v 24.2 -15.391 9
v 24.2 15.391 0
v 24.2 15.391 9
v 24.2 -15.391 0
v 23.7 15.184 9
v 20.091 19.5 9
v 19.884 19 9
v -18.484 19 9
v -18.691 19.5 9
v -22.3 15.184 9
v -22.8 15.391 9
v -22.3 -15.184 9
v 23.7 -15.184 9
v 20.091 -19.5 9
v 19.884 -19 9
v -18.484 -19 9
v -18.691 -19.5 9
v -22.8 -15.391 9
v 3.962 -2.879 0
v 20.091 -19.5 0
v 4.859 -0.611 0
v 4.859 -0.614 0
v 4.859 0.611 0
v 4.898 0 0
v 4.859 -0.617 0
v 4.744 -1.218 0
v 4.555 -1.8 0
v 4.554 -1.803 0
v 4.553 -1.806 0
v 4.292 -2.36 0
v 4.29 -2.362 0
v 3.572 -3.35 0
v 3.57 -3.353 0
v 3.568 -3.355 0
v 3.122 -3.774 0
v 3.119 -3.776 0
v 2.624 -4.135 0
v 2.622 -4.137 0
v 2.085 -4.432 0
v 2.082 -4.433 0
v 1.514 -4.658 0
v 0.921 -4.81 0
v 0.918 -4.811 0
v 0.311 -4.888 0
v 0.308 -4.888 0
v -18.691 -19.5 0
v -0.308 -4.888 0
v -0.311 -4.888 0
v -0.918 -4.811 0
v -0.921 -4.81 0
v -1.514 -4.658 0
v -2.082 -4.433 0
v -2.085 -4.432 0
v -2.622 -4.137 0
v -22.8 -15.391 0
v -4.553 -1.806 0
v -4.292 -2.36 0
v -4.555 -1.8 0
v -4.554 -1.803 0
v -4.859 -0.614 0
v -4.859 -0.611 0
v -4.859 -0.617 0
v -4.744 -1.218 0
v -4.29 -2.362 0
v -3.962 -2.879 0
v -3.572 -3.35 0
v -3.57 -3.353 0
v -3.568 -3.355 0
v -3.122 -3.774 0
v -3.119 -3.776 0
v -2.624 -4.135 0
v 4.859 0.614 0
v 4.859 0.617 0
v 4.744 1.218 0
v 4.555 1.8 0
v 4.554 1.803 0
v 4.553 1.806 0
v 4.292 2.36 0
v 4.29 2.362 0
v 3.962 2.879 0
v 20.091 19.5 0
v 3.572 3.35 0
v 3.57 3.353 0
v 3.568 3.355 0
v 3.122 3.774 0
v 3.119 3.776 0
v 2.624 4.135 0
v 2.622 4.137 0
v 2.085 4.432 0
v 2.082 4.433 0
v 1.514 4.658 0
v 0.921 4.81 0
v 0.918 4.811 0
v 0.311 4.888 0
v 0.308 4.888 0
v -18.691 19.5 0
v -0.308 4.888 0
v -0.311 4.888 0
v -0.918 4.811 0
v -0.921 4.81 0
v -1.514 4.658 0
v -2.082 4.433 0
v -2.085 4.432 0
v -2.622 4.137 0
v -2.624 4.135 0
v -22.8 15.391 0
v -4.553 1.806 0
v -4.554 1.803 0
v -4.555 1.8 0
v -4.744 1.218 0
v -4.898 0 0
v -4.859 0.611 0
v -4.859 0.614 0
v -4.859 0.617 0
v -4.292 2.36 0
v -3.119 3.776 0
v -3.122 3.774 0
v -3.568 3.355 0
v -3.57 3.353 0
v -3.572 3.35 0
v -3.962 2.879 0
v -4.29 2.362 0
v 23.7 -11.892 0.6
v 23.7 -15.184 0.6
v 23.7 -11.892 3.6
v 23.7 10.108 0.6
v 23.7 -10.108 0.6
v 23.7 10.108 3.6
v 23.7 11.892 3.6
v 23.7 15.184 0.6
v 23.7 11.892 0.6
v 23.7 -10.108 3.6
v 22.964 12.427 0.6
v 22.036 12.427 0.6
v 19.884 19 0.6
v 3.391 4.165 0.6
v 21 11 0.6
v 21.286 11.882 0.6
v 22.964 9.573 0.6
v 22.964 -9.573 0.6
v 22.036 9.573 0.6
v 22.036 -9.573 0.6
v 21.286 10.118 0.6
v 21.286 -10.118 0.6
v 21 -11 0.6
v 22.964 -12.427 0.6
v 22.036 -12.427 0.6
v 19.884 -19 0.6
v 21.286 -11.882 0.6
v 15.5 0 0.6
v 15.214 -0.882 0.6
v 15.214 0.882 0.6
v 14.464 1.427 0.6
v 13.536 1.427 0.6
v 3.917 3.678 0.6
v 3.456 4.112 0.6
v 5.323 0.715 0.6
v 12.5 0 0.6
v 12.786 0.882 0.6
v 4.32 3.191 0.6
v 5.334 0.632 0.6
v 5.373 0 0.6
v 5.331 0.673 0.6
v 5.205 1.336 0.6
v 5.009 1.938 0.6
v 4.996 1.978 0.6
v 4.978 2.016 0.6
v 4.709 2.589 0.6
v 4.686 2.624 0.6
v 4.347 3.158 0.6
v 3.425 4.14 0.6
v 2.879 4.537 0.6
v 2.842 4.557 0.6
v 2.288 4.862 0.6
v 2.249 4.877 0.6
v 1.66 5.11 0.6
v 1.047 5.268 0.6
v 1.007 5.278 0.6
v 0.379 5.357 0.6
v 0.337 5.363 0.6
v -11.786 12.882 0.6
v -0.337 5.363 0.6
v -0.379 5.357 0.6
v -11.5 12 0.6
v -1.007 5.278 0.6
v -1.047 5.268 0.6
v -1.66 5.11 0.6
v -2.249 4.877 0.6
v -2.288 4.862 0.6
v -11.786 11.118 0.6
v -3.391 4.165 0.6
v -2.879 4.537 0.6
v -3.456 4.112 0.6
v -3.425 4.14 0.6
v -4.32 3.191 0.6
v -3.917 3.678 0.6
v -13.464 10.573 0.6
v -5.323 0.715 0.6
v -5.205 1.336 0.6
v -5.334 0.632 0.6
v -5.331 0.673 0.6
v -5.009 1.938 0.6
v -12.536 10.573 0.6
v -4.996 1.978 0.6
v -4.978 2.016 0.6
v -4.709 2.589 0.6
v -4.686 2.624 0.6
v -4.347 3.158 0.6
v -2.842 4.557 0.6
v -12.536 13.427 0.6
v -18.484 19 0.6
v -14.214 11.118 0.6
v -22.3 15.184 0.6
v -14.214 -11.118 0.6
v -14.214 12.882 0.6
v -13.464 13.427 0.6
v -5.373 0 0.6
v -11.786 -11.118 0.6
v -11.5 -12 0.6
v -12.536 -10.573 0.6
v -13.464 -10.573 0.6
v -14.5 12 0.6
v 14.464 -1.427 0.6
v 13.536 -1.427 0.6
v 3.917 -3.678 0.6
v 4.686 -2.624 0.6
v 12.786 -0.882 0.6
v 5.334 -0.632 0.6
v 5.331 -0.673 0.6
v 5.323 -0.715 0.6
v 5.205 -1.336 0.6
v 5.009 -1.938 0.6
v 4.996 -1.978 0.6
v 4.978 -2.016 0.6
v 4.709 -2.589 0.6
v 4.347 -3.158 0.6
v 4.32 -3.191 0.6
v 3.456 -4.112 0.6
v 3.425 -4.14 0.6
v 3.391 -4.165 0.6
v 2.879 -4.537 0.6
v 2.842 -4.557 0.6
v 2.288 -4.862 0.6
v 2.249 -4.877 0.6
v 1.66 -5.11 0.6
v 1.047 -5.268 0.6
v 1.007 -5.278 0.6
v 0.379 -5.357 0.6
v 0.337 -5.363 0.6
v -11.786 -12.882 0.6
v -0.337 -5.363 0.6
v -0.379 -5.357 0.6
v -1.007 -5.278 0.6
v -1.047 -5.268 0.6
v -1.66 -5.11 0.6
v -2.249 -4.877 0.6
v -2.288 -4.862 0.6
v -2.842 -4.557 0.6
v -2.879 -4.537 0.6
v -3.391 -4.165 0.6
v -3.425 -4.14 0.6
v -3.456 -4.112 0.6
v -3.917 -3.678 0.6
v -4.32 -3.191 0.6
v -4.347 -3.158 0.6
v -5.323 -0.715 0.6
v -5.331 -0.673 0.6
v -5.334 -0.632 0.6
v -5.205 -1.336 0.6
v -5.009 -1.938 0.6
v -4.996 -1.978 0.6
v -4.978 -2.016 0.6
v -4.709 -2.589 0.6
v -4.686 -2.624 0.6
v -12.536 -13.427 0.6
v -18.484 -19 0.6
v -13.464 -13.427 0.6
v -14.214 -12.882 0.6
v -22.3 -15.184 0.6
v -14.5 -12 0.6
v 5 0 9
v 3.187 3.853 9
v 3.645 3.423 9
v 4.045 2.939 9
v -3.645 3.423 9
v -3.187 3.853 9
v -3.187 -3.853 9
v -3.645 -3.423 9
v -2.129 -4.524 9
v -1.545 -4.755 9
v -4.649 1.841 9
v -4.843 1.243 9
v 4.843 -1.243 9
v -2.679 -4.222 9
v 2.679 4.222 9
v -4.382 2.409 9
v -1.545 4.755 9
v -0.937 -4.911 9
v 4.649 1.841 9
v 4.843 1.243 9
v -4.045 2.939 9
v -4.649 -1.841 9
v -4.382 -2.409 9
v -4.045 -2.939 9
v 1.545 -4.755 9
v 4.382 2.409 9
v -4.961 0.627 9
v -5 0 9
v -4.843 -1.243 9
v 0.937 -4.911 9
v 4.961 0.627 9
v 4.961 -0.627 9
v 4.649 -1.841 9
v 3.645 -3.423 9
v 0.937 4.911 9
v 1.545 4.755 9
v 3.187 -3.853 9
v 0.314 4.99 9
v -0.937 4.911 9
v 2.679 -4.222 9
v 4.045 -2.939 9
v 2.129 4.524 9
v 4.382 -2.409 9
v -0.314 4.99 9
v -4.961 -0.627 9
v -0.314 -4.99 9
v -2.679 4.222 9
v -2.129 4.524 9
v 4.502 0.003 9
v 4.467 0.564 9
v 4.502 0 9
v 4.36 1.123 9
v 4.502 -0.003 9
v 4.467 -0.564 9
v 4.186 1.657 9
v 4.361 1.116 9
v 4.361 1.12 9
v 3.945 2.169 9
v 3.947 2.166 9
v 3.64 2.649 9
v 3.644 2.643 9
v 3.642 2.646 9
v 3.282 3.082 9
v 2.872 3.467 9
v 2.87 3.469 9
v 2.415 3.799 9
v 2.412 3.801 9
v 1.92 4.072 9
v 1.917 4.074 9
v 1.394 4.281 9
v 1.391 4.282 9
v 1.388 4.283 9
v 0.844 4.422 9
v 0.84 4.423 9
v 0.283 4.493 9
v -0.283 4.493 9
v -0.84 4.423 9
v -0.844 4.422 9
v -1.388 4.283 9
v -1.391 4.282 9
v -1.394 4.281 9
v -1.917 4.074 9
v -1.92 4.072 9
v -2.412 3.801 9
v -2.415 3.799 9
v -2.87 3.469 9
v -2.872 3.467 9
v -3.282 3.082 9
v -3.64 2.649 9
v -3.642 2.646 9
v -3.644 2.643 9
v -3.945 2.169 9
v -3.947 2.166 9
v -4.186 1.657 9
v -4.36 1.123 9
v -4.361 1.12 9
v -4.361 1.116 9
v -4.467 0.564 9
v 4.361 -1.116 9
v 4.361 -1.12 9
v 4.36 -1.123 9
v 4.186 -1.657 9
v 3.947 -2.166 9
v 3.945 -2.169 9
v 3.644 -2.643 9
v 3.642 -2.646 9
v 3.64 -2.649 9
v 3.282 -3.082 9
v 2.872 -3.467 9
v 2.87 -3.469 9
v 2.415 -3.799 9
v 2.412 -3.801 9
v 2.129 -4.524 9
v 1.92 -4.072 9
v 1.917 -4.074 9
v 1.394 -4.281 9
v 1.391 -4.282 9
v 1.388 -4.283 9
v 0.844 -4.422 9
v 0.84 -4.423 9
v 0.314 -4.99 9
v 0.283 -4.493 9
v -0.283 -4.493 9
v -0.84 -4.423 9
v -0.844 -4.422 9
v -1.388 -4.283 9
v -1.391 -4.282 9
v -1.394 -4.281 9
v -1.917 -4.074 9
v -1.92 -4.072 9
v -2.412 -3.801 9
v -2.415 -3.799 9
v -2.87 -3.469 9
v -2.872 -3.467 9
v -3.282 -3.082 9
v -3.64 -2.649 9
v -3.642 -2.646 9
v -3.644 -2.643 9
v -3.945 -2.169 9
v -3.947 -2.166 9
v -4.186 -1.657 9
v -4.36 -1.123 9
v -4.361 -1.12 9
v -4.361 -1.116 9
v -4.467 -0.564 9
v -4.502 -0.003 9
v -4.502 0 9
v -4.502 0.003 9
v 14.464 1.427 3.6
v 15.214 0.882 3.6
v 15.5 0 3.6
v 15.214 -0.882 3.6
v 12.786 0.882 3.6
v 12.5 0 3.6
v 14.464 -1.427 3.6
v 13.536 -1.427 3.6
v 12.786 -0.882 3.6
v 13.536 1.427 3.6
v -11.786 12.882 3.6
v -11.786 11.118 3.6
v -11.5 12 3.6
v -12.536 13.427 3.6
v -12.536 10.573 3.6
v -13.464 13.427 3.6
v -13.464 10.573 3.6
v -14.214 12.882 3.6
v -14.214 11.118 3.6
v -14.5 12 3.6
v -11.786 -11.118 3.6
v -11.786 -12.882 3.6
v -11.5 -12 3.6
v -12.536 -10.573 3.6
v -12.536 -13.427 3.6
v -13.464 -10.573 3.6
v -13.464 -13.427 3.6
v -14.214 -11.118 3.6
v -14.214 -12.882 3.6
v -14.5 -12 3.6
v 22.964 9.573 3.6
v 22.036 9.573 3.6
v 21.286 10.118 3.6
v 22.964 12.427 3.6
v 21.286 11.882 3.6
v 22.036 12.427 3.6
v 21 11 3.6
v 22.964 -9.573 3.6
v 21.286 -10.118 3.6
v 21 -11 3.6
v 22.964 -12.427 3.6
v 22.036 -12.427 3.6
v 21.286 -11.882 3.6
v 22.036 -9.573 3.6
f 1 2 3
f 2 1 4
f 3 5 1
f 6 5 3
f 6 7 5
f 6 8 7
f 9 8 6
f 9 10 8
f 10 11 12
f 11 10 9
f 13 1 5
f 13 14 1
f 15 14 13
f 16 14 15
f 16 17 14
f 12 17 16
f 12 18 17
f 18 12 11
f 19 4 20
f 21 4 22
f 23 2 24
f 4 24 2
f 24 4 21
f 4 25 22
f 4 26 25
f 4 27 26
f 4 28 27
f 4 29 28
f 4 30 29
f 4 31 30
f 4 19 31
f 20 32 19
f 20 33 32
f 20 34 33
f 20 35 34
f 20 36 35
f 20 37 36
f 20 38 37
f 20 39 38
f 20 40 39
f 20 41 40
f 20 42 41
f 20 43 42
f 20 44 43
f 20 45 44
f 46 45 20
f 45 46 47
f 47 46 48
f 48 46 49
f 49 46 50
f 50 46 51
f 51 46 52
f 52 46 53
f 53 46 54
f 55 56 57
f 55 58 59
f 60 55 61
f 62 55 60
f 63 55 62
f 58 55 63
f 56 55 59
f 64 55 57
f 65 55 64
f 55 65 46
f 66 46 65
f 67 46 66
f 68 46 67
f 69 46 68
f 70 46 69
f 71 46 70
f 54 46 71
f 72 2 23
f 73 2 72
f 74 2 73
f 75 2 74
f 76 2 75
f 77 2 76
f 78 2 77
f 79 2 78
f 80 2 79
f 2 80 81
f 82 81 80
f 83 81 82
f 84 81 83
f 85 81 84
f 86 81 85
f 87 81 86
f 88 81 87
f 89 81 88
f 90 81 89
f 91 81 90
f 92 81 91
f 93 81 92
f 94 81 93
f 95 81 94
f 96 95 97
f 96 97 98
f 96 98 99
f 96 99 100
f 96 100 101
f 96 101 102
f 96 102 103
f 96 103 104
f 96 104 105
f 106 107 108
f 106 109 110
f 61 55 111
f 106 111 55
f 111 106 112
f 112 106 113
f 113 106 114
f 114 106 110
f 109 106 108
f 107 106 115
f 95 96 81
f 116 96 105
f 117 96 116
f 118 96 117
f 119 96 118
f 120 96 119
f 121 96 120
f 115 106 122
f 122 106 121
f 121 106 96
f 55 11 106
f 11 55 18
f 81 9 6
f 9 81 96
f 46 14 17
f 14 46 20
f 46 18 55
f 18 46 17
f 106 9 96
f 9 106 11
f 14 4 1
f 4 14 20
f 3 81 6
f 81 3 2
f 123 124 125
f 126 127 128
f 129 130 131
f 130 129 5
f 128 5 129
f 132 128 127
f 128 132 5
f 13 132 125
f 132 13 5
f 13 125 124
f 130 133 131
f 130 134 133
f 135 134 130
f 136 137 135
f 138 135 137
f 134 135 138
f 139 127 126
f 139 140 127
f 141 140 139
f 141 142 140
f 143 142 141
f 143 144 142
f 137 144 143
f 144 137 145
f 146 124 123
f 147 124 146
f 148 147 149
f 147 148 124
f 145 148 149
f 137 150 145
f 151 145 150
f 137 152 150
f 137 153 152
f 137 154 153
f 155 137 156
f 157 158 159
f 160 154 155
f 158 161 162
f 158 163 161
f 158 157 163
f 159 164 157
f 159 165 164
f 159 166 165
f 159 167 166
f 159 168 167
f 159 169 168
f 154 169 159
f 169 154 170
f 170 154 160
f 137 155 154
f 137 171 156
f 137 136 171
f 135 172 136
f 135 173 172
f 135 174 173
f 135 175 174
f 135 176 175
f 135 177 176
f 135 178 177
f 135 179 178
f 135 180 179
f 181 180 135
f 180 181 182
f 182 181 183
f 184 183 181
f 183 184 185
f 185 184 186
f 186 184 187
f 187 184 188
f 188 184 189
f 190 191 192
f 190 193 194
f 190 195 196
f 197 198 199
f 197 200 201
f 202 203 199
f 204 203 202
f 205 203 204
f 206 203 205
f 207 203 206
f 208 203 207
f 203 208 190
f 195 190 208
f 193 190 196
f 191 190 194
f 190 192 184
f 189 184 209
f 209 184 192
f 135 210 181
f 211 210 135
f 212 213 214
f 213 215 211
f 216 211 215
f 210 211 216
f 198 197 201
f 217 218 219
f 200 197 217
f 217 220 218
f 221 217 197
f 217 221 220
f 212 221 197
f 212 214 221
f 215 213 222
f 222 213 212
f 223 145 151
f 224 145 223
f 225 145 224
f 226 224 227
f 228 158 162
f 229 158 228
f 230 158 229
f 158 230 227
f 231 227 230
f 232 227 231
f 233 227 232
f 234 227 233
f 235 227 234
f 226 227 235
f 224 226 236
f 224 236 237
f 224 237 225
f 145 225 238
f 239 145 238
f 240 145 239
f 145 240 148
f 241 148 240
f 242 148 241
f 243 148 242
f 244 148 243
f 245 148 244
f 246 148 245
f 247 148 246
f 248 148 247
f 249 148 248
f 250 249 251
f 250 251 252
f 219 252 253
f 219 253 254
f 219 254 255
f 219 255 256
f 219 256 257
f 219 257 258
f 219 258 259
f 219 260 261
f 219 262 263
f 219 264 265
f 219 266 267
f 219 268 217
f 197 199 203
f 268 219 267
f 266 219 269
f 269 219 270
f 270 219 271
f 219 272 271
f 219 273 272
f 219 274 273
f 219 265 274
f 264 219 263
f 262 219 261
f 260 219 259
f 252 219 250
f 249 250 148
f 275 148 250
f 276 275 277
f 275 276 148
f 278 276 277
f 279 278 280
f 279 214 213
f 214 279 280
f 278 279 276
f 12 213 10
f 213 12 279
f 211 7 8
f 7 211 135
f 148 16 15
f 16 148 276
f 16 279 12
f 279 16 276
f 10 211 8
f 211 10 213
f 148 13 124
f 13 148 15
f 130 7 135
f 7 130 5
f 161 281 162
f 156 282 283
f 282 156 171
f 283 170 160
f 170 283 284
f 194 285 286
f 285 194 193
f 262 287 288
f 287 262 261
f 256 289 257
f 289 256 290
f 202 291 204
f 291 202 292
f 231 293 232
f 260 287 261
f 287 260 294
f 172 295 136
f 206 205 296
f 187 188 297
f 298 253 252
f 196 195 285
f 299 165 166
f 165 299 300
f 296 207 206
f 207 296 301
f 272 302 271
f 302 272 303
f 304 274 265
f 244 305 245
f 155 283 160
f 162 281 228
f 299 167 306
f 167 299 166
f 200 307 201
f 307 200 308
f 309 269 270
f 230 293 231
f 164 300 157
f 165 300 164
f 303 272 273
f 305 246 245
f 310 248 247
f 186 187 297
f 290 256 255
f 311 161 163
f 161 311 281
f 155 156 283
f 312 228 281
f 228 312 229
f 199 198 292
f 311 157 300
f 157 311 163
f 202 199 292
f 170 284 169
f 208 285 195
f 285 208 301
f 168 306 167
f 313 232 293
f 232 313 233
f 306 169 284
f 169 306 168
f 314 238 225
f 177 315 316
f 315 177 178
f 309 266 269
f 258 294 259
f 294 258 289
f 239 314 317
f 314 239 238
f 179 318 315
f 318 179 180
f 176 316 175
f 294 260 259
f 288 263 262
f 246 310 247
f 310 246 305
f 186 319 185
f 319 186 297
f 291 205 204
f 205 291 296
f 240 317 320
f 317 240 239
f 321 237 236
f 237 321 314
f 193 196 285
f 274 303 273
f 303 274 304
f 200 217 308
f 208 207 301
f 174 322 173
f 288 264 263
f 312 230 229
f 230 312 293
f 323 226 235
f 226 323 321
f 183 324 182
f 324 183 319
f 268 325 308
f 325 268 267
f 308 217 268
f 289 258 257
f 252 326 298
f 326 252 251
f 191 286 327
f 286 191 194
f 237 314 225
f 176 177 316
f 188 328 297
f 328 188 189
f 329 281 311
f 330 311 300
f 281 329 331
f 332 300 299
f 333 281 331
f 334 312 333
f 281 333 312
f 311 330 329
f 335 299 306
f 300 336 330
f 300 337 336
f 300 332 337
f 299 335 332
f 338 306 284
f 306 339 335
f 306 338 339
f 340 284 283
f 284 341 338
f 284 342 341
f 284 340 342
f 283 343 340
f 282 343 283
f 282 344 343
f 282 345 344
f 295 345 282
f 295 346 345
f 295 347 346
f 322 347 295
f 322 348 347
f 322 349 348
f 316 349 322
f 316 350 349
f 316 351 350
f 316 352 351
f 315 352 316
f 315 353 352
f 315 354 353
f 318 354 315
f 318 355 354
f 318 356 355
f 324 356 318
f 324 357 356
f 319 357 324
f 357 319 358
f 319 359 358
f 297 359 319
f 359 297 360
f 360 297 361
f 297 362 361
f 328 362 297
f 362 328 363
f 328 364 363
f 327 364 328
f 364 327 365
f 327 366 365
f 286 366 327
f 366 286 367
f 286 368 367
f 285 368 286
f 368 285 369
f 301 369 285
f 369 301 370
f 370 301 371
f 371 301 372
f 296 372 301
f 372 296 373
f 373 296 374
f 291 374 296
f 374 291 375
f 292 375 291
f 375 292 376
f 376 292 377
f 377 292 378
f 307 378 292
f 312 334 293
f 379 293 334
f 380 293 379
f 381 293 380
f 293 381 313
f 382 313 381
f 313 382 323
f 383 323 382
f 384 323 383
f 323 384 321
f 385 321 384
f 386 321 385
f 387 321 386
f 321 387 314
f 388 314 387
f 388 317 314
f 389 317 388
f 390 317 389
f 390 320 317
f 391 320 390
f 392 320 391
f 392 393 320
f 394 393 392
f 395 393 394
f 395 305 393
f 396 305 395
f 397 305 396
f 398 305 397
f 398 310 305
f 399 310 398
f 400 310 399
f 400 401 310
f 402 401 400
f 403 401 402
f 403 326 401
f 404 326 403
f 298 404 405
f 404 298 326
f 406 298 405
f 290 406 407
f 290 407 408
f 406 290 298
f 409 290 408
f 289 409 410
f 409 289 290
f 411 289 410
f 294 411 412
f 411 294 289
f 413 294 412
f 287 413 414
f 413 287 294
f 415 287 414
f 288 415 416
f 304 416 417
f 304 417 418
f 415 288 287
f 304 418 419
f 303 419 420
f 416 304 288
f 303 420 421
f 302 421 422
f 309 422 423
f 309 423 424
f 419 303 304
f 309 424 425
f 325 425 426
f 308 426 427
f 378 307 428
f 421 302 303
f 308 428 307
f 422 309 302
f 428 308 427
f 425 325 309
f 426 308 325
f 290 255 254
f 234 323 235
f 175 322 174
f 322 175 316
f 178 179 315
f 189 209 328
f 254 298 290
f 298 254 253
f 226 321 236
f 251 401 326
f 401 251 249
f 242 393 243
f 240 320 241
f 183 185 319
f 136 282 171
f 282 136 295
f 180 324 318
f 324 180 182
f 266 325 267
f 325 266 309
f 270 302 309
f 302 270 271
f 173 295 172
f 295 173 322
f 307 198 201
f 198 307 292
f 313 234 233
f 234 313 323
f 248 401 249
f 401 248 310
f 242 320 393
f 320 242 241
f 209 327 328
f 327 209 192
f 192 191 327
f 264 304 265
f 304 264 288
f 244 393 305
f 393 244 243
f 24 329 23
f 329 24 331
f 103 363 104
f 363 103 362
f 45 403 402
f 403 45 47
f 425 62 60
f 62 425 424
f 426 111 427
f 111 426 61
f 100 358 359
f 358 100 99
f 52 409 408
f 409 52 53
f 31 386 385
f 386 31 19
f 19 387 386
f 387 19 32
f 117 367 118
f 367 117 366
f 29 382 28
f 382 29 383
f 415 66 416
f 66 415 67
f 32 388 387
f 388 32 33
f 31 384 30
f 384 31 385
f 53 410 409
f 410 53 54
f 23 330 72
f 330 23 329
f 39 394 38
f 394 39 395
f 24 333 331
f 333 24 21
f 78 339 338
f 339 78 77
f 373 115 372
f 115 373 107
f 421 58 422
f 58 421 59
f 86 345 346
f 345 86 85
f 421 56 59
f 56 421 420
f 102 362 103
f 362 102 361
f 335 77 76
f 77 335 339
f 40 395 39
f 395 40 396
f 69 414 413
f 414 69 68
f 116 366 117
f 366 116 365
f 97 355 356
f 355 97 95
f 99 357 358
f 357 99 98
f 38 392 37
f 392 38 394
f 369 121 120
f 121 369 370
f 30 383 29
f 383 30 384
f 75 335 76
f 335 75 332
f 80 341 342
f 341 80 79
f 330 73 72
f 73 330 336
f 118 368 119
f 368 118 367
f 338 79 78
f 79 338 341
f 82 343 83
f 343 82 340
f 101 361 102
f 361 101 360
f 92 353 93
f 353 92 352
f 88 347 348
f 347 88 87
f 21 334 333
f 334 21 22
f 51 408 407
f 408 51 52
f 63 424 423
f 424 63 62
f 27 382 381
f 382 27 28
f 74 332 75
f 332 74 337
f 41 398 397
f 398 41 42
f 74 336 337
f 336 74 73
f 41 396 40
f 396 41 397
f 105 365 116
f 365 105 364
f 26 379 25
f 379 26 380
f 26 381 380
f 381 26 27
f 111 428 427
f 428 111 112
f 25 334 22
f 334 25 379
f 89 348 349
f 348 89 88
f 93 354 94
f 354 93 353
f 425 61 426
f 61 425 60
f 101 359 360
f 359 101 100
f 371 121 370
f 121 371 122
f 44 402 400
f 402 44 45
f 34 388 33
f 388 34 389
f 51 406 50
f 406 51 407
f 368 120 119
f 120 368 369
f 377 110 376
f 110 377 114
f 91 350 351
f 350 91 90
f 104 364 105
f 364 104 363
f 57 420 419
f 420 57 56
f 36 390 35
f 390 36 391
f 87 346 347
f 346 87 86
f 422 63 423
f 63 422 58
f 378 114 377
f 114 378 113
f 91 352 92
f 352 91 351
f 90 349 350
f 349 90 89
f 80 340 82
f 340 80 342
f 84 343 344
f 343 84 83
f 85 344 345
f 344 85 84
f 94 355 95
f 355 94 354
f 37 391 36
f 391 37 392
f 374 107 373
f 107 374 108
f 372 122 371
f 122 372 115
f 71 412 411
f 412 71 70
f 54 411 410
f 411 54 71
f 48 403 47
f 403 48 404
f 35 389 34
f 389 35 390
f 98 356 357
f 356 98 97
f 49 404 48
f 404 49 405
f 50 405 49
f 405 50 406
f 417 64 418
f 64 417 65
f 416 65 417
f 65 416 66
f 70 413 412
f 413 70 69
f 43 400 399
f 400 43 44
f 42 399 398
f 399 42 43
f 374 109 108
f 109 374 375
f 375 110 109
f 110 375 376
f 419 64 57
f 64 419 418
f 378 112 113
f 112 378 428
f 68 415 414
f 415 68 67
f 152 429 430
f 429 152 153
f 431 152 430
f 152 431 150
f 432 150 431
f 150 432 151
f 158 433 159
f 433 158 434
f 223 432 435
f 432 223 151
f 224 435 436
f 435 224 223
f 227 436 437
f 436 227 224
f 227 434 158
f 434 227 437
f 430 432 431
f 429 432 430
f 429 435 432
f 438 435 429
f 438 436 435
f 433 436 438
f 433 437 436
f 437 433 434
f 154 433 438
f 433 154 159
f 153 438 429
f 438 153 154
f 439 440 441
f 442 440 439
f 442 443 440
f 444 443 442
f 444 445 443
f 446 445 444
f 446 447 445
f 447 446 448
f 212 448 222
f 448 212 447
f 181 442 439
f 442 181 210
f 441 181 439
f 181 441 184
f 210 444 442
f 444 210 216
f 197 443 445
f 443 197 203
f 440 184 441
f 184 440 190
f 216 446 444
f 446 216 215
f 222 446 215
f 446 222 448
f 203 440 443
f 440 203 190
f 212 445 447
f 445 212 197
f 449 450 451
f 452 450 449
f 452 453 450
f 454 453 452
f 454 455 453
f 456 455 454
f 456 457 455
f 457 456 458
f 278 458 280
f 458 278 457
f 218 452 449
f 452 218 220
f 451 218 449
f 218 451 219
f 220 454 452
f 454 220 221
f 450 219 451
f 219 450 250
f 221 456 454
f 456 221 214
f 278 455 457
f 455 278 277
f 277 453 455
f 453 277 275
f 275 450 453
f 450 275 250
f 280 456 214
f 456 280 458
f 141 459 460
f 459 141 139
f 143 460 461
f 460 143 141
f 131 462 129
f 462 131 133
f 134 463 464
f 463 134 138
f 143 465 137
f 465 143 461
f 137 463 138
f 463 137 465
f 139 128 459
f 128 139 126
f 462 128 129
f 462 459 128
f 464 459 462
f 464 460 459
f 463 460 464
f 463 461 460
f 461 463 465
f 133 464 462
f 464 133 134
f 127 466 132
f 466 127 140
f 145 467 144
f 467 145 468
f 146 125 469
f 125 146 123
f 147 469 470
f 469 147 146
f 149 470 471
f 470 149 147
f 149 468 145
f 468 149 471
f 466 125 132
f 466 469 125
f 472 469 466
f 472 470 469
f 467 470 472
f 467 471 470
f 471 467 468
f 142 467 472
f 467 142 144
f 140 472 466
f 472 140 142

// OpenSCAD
union() {
    difference() {
        translate([0.7,0,4.5]) {
            intersection() {
                cube([47,39,9], center=true);
                rotate(45) {
                    cube(55, center=true);
                }
            }
        }
        translate([0.7,0,5.1]) {
            intersection() {
                cube([46,38,9], center=true);
                rotate(45) {
                    cube(54, center=true);
                }
            }
        }
        translate([0,0,4.5]) {
            cylinder(20,5.0,5.0,center=true,$fn=50);
        }
    }

    translate([+14,0,1.8]) {
        cylinder(3.6,1.5,1.5,center=true,$fn=10);
    }
    translate([-13,+12,1.8]) {
        cylinder(3.6,1.5,1.5,center=true,$fn=10);
    }
    translate([-13,-12,1.8]) {
        cylinder(3.6,1.5,1.5,center=true,$fn=10);
    }
    translate([+22.5,+11,1.8]) {
        cylinder(3.6,1.5,1.5,center=true,$fn=10);
    }
    translate([+22.5,-11,1.8]) {
        cylinder(3.6,1.5,1.5,center=true,$fn=10);
    }

    translate([0,0,4.5]) {
        difference() {
            cylinder(9.0,5.4,5.0,center=true,$fn=50);
            cylinder(9.1,4.9,4.5,center=true,$fn=50);
        }
    }
}
